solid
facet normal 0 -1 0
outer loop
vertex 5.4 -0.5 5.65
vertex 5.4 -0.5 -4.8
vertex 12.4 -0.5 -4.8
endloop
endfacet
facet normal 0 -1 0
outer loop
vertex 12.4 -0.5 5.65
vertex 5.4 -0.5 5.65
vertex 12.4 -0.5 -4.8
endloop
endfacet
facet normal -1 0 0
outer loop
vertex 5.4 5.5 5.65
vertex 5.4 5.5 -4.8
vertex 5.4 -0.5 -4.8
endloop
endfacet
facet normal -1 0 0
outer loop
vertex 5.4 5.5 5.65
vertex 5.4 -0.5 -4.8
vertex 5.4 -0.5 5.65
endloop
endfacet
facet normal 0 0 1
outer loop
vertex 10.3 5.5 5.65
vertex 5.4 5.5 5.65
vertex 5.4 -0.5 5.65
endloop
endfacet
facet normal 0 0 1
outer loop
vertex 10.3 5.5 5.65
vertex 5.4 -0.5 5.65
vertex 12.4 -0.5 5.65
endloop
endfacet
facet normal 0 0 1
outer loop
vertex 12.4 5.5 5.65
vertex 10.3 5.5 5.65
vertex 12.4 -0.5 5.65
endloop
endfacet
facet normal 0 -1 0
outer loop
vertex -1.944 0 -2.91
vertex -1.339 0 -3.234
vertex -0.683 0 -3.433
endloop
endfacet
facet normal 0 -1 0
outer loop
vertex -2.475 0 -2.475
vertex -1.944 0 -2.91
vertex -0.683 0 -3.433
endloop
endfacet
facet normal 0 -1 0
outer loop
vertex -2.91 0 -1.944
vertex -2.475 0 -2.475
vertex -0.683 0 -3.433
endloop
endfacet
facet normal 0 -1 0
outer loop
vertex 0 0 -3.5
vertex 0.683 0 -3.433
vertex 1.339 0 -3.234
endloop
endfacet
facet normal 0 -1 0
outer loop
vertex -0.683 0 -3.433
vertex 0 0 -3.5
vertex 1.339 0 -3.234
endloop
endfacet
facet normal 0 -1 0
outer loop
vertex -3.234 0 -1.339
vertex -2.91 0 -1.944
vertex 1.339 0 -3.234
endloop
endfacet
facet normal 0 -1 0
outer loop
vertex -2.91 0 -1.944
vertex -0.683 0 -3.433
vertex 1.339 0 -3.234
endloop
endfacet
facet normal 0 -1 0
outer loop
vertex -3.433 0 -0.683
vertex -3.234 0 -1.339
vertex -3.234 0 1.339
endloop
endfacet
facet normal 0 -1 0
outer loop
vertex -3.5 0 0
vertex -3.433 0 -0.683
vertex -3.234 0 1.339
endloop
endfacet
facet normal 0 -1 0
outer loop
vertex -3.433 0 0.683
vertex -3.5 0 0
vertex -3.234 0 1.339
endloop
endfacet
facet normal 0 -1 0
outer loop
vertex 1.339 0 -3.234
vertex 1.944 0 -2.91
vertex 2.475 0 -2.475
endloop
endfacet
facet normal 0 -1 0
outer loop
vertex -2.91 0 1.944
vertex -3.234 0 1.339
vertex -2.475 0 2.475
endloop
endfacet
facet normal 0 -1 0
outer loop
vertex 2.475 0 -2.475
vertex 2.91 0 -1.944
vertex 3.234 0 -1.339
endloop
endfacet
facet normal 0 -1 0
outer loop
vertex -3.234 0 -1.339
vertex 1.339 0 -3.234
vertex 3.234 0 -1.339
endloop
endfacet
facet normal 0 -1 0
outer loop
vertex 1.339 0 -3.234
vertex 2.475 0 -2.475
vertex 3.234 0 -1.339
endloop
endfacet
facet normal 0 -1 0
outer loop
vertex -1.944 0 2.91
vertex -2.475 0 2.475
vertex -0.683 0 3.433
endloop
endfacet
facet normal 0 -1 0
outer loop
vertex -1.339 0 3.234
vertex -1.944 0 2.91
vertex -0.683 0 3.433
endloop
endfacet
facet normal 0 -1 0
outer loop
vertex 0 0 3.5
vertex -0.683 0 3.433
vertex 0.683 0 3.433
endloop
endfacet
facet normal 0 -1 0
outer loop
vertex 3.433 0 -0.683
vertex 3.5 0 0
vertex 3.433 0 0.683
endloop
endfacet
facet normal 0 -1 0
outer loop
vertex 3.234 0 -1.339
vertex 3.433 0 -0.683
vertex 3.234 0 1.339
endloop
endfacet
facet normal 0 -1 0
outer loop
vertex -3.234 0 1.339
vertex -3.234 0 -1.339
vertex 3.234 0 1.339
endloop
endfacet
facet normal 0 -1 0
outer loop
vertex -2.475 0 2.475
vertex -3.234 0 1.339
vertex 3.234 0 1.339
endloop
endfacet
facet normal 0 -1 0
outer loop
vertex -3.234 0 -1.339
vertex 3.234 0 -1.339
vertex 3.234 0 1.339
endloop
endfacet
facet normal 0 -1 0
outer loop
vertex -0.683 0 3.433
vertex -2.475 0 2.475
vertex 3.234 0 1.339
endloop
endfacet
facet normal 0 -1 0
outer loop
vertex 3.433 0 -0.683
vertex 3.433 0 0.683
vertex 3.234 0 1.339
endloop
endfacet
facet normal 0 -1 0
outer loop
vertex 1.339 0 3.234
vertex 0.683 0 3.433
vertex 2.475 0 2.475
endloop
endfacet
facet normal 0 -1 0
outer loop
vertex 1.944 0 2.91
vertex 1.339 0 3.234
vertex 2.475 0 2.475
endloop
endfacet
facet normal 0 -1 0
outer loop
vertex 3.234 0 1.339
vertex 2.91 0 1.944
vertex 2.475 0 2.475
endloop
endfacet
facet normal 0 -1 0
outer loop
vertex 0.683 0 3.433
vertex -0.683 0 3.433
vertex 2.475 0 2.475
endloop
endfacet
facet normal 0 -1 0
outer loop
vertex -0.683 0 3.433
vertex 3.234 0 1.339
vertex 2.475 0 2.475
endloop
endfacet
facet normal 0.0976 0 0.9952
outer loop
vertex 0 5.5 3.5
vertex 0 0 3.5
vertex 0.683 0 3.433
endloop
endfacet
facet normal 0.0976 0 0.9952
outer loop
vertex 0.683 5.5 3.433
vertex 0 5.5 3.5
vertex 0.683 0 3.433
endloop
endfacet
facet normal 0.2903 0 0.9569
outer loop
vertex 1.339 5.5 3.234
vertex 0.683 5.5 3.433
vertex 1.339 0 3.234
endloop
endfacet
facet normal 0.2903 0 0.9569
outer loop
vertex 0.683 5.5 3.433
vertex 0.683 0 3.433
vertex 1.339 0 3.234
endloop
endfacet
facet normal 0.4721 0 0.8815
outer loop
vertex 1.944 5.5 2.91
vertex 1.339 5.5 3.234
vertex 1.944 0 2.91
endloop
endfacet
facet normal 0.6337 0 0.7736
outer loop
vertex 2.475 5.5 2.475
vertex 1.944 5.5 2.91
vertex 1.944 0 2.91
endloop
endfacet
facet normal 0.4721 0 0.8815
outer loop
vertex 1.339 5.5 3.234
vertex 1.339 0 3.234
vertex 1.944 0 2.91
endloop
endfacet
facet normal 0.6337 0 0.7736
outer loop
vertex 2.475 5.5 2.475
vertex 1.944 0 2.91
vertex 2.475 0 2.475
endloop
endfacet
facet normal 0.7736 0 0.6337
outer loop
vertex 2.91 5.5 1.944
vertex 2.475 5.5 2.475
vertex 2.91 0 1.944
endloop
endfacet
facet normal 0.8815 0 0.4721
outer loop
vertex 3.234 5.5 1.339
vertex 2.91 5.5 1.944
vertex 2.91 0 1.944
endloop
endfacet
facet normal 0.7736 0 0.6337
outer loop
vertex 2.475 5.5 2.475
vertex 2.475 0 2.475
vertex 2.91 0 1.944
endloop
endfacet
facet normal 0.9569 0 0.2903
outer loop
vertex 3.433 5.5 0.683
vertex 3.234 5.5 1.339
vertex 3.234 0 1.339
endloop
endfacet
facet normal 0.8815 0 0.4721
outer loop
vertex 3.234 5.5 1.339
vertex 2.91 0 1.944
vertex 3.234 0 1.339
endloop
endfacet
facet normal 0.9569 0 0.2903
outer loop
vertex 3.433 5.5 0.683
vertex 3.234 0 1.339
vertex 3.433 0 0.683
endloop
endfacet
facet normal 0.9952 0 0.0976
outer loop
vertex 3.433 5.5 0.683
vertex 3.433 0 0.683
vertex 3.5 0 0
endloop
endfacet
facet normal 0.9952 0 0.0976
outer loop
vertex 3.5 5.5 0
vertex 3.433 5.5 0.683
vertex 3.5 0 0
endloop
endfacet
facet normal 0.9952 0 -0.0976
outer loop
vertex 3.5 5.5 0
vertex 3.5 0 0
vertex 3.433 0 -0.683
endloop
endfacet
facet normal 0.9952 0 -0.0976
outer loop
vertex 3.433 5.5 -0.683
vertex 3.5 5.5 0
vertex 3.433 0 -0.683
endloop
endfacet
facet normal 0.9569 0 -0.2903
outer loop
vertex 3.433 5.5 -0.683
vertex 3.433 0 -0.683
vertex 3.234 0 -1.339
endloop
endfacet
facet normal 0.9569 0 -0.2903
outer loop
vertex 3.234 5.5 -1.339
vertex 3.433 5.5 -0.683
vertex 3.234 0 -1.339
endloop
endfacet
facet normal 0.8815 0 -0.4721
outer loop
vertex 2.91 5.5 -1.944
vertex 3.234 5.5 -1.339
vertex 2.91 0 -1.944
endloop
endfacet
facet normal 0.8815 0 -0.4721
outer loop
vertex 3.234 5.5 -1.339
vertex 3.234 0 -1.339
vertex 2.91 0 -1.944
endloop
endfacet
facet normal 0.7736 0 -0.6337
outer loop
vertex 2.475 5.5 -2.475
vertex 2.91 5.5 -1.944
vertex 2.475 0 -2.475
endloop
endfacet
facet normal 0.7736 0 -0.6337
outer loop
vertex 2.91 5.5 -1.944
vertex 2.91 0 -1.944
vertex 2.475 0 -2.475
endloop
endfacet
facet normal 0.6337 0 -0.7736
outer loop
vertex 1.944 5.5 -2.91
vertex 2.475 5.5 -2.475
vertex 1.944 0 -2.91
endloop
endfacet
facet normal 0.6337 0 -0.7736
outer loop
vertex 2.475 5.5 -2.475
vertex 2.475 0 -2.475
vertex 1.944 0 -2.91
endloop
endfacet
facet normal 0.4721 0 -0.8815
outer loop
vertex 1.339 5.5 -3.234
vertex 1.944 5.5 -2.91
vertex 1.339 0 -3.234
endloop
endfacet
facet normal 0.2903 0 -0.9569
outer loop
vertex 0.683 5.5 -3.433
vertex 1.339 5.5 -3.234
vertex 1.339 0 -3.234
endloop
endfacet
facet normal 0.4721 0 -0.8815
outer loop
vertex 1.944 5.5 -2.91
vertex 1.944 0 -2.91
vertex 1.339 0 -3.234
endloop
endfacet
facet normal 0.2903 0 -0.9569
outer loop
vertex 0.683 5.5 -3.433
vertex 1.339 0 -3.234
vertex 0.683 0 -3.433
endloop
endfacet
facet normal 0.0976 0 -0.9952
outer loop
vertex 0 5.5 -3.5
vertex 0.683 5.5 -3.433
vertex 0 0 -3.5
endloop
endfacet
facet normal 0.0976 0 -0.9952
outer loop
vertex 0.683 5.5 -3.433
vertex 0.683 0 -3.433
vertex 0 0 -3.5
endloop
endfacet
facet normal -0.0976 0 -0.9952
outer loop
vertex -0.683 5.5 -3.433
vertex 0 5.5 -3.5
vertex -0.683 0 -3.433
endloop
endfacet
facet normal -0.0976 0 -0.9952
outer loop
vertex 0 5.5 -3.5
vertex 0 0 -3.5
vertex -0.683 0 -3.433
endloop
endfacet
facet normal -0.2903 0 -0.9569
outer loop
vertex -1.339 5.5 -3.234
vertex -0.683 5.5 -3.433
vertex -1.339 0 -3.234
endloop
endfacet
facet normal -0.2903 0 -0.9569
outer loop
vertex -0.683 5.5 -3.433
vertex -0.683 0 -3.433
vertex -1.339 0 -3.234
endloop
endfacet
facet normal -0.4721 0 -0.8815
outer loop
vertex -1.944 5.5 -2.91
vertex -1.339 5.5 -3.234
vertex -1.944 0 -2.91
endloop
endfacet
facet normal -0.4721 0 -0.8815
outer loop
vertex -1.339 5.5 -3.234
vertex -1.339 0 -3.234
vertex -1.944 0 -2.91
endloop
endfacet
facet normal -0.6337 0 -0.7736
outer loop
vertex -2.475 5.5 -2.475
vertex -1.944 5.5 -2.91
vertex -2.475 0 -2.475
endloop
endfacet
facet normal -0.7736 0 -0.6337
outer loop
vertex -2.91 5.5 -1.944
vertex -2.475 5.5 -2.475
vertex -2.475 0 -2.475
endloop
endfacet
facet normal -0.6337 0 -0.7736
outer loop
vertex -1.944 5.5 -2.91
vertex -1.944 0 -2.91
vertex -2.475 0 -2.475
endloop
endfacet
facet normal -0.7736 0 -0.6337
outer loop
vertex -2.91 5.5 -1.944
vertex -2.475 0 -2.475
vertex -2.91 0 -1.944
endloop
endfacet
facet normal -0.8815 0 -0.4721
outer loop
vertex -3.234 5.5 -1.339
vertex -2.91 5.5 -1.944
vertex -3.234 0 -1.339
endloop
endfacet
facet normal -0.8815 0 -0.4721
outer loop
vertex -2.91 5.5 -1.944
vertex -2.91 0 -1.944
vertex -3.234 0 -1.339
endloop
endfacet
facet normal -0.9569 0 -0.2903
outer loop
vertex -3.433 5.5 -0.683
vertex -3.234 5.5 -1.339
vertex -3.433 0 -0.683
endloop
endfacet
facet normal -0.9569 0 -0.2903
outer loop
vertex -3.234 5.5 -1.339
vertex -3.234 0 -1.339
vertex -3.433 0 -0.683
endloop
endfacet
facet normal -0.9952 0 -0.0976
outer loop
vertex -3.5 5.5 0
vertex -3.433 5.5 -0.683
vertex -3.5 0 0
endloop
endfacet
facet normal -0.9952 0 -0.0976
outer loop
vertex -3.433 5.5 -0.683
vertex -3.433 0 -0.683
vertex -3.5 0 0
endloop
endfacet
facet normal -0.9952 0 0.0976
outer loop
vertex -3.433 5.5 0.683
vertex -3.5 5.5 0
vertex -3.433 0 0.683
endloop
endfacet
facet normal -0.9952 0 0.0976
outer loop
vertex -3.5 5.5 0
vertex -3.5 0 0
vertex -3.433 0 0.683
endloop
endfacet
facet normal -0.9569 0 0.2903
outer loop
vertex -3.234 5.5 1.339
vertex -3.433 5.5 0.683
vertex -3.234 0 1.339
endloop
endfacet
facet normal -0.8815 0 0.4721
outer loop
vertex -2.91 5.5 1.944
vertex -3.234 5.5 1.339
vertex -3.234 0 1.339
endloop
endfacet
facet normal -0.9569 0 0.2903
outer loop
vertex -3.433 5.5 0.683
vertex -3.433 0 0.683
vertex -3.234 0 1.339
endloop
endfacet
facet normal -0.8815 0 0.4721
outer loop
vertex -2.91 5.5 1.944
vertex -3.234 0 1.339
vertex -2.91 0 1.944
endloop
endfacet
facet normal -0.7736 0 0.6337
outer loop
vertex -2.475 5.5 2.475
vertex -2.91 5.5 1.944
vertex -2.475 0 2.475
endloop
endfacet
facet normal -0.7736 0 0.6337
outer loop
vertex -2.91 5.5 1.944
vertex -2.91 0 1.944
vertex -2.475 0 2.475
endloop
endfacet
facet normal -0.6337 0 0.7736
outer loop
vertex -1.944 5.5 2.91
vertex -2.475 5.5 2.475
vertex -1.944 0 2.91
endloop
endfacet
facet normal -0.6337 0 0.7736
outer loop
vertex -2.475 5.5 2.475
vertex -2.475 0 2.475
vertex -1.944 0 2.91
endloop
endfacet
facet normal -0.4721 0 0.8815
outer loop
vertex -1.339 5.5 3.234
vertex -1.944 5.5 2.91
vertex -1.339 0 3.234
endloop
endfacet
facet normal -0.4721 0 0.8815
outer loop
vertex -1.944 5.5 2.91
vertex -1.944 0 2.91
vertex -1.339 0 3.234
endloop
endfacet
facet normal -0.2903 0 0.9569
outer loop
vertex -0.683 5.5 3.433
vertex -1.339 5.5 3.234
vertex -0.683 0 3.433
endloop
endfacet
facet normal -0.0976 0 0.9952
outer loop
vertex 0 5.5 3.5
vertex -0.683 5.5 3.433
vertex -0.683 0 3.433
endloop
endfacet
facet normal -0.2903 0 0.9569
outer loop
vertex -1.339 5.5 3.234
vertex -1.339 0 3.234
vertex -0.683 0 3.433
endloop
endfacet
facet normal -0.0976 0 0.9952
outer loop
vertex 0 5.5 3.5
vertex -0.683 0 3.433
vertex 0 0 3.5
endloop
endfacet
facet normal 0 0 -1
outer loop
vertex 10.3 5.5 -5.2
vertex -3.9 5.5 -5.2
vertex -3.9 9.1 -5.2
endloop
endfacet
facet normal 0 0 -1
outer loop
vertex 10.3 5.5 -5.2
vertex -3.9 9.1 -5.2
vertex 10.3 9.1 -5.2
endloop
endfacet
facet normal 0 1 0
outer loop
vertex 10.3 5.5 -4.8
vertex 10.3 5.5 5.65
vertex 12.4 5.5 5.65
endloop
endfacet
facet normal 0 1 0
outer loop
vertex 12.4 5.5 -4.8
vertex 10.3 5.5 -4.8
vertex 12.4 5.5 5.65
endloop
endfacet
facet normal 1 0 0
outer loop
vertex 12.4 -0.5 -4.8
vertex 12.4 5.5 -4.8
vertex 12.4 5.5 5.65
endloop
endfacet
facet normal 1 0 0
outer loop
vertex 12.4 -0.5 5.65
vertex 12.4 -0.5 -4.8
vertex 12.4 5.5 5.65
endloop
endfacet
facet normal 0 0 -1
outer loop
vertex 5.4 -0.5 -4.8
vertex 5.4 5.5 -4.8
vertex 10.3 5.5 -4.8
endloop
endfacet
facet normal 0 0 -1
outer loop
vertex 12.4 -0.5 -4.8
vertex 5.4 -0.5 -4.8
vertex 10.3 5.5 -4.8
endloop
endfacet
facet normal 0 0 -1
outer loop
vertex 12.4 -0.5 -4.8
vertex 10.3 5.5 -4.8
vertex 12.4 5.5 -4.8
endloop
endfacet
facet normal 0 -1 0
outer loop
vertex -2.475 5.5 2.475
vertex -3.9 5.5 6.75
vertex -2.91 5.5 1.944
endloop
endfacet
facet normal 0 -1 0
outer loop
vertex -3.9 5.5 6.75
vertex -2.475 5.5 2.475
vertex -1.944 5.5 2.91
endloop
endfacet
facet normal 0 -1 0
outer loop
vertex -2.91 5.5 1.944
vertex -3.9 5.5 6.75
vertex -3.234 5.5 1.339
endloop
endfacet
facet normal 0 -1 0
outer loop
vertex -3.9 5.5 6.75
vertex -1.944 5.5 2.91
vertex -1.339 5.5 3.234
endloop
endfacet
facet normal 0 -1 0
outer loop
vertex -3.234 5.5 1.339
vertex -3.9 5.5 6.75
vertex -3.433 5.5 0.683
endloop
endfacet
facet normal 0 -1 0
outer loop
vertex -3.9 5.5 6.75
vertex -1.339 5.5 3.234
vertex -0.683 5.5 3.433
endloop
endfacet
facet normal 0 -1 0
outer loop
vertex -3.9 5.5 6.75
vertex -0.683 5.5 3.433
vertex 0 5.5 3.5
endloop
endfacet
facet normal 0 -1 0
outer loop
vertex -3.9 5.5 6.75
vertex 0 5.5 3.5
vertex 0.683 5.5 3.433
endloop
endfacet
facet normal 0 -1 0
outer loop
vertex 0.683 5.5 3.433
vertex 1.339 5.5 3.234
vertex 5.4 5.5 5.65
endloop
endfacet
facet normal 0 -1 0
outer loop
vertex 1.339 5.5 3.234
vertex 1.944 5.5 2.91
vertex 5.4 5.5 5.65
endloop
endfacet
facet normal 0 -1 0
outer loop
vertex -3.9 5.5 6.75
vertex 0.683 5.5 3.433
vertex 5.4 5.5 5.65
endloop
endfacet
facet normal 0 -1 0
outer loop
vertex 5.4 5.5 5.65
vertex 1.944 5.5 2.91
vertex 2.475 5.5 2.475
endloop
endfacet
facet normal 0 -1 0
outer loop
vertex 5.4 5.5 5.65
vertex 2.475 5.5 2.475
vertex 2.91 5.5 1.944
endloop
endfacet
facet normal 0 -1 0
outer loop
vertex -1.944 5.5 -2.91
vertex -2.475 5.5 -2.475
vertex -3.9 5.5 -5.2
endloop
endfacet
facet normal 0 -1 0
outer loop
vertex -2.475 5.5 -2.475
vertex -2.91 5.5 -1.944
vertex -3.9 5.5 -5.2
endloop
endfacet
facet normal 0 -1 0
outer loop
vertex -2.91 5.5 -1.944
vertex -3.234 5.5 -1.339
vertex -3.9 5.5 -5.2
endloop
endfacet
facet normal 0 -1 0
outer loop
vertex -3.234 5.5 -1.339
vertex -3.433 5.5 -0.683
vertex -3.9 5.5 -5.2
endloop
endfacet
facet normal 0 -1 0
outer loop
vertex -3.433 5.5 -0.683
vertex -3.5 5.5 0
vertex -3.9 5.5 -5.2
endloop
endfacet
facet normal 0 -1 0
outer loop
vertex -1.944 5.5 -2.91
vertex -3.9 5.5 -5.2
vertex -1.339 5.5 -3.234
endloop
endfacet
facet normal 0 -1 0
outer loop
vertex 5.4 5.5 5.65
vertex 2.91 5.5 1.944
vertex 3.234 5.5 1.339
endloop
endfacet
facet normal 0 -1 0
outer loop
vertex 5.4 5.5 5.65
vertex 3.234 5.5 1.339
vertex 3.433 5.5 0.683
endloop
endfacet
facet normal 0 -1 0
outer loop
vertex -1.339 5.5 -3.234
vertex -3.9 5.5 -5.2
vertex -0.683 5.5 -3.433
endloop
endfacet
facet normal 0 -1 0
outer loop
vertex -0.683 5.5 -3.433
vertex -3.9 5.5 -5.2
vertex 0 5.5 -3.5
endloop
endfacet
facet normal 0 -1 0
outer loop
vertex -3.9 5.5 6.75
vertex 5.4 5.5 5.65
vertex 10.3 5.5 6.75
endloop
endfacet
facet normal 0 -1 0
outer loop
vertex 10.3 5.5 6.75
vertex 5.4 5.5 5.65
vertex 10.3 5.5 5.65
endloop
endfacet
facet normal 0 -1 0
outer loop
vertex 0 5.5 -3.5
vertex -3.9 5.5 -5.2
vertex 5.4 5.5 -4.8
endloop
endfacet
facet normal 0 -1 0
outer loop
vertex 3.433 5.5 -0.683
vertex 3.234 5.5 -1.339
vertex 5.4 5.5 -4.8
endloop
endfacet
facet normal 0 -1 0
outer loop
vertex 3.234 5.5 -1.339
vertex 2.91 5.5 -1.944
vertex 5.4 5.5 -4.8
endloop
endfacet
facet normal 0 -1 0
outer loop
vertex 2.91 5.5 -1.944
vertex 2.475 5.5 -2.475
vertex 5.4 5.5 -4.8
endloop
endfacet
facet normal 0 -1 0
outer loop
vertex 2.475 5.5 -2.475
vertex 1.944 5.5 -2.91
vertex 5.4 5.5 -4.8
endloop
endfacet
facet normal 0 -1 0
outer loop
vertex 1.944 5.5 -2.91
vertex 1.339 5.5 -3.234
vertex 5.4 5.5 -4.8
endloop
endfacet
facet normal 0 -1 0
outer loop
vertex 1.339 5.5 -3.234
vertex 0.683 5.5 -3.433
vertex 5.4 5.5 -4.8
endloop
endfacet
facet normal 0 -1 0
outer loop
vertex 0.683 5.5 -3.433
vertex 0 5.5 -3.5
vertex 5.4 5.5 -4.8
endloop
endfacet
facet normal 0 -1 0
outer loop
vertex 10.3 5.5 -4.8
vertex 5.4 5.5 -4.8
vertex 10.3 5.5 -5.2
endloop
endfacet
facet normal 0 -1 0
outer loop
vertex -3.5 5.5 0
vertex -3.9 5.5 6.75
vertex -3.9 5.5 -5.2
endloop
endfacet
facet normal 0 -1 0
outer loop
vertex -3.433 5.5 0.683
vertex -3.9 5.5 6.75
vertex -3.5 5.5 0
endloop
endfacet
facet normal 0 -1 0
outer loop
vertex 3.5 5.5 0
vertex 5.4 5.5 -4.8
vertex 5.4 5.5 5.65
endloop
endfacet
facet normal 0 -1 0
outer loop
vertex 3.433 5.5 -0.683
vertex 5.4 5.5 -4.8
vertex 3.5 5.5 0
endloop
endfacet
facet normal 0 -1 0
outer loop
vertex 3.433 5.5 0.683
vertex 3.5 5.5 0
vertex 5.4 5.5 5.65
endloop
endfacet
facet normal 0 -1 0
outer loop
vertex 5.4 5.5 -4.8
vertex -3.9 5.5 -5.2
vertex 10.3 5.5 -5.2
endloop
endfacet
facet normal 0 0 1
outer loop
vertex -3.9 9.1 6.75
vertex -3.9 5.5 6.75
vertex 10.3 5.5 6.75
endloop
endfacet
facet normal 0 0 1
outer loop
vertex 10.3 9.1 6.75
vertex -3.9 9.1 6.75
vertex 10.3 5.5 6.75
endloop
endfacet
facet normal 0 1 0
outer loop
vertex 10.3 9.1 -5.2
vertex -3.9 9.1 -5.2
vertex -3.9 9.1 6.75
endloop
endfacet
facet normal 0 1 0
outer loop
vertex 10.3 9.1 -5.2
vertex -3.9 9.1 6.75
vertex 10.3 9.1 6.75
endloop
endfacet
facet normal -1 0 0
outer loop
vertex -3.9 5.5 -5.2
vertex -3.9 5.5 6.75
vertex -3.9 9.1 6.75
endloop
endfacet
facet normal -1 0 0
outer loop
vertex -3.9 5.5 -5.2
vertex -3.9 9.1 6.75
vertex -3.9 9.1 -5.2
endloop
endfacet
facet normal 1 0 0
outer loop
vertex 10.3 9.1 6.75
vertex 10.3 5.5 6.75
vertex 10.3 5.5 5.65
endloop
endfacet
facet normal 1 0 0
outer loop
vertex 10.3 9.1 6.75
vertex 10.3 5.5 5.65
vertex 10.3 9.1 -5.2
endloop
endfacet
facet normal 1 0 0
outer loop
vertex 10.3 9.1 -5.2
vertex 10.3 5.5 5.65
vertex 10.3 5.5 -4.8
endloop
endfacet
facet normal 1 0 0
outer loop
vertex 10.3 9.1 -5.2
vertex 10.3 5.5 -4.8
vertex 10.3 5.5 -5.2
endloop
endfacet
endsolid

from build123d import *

# Parameters (mm, degrees)
SKETCH3_R           = 3.5
BOSS_EXTRUDE2_DEPTH = 5.5
SKETCH1_W           = 14.2
SKETCH1_H           = 11.95
BOSS_EXTRUDE3_DEPTH = 3.6
SKETCH4_W           = 7
SKETCH4_H           = 10.45
BOSS_EXTRUDE4_DEPTH = 6


with BuildPart() as part:
    # Sketch3 → Boss-Extrude2 (new body)
    with BuildSketch(Plane(origin=(0, 0, 0), x_dir=(1, 0, 0), z_dir=(0, 1, 0))):
        with Locations(Location((0, 0, 0), (0, 0, 270))):
            Circle(SKETCH3_R)
    extrude(amount=BOSS_EXTRUDE2_DEPTH)

    # Sketch1 → Boss-Extrude3 (add)
    with BuildSketch(Plane(origin=(0, 5.5, 0), x_dir=(1, 0, 0), z_dir=(0, 1, 0))):
        with Locations((3.2, -0.775)):
            Rectangle(SKETCH1_W, SKETCH1_H)
    extrude(amount=BOSS_EXTRUDE3_DEPTH)

    # Sketch4 → Boss-Extrude4 (add)
    with BuildSketch(Plane.XZ.offset(-5.5)):
        with Locations((8.9, 0.425)):
            Rectangle(SKETCH4_W, SKETCH4_H)
    extrude(amount=BOSS_EXTRUDE4_DEPTH)


solid = part.part
